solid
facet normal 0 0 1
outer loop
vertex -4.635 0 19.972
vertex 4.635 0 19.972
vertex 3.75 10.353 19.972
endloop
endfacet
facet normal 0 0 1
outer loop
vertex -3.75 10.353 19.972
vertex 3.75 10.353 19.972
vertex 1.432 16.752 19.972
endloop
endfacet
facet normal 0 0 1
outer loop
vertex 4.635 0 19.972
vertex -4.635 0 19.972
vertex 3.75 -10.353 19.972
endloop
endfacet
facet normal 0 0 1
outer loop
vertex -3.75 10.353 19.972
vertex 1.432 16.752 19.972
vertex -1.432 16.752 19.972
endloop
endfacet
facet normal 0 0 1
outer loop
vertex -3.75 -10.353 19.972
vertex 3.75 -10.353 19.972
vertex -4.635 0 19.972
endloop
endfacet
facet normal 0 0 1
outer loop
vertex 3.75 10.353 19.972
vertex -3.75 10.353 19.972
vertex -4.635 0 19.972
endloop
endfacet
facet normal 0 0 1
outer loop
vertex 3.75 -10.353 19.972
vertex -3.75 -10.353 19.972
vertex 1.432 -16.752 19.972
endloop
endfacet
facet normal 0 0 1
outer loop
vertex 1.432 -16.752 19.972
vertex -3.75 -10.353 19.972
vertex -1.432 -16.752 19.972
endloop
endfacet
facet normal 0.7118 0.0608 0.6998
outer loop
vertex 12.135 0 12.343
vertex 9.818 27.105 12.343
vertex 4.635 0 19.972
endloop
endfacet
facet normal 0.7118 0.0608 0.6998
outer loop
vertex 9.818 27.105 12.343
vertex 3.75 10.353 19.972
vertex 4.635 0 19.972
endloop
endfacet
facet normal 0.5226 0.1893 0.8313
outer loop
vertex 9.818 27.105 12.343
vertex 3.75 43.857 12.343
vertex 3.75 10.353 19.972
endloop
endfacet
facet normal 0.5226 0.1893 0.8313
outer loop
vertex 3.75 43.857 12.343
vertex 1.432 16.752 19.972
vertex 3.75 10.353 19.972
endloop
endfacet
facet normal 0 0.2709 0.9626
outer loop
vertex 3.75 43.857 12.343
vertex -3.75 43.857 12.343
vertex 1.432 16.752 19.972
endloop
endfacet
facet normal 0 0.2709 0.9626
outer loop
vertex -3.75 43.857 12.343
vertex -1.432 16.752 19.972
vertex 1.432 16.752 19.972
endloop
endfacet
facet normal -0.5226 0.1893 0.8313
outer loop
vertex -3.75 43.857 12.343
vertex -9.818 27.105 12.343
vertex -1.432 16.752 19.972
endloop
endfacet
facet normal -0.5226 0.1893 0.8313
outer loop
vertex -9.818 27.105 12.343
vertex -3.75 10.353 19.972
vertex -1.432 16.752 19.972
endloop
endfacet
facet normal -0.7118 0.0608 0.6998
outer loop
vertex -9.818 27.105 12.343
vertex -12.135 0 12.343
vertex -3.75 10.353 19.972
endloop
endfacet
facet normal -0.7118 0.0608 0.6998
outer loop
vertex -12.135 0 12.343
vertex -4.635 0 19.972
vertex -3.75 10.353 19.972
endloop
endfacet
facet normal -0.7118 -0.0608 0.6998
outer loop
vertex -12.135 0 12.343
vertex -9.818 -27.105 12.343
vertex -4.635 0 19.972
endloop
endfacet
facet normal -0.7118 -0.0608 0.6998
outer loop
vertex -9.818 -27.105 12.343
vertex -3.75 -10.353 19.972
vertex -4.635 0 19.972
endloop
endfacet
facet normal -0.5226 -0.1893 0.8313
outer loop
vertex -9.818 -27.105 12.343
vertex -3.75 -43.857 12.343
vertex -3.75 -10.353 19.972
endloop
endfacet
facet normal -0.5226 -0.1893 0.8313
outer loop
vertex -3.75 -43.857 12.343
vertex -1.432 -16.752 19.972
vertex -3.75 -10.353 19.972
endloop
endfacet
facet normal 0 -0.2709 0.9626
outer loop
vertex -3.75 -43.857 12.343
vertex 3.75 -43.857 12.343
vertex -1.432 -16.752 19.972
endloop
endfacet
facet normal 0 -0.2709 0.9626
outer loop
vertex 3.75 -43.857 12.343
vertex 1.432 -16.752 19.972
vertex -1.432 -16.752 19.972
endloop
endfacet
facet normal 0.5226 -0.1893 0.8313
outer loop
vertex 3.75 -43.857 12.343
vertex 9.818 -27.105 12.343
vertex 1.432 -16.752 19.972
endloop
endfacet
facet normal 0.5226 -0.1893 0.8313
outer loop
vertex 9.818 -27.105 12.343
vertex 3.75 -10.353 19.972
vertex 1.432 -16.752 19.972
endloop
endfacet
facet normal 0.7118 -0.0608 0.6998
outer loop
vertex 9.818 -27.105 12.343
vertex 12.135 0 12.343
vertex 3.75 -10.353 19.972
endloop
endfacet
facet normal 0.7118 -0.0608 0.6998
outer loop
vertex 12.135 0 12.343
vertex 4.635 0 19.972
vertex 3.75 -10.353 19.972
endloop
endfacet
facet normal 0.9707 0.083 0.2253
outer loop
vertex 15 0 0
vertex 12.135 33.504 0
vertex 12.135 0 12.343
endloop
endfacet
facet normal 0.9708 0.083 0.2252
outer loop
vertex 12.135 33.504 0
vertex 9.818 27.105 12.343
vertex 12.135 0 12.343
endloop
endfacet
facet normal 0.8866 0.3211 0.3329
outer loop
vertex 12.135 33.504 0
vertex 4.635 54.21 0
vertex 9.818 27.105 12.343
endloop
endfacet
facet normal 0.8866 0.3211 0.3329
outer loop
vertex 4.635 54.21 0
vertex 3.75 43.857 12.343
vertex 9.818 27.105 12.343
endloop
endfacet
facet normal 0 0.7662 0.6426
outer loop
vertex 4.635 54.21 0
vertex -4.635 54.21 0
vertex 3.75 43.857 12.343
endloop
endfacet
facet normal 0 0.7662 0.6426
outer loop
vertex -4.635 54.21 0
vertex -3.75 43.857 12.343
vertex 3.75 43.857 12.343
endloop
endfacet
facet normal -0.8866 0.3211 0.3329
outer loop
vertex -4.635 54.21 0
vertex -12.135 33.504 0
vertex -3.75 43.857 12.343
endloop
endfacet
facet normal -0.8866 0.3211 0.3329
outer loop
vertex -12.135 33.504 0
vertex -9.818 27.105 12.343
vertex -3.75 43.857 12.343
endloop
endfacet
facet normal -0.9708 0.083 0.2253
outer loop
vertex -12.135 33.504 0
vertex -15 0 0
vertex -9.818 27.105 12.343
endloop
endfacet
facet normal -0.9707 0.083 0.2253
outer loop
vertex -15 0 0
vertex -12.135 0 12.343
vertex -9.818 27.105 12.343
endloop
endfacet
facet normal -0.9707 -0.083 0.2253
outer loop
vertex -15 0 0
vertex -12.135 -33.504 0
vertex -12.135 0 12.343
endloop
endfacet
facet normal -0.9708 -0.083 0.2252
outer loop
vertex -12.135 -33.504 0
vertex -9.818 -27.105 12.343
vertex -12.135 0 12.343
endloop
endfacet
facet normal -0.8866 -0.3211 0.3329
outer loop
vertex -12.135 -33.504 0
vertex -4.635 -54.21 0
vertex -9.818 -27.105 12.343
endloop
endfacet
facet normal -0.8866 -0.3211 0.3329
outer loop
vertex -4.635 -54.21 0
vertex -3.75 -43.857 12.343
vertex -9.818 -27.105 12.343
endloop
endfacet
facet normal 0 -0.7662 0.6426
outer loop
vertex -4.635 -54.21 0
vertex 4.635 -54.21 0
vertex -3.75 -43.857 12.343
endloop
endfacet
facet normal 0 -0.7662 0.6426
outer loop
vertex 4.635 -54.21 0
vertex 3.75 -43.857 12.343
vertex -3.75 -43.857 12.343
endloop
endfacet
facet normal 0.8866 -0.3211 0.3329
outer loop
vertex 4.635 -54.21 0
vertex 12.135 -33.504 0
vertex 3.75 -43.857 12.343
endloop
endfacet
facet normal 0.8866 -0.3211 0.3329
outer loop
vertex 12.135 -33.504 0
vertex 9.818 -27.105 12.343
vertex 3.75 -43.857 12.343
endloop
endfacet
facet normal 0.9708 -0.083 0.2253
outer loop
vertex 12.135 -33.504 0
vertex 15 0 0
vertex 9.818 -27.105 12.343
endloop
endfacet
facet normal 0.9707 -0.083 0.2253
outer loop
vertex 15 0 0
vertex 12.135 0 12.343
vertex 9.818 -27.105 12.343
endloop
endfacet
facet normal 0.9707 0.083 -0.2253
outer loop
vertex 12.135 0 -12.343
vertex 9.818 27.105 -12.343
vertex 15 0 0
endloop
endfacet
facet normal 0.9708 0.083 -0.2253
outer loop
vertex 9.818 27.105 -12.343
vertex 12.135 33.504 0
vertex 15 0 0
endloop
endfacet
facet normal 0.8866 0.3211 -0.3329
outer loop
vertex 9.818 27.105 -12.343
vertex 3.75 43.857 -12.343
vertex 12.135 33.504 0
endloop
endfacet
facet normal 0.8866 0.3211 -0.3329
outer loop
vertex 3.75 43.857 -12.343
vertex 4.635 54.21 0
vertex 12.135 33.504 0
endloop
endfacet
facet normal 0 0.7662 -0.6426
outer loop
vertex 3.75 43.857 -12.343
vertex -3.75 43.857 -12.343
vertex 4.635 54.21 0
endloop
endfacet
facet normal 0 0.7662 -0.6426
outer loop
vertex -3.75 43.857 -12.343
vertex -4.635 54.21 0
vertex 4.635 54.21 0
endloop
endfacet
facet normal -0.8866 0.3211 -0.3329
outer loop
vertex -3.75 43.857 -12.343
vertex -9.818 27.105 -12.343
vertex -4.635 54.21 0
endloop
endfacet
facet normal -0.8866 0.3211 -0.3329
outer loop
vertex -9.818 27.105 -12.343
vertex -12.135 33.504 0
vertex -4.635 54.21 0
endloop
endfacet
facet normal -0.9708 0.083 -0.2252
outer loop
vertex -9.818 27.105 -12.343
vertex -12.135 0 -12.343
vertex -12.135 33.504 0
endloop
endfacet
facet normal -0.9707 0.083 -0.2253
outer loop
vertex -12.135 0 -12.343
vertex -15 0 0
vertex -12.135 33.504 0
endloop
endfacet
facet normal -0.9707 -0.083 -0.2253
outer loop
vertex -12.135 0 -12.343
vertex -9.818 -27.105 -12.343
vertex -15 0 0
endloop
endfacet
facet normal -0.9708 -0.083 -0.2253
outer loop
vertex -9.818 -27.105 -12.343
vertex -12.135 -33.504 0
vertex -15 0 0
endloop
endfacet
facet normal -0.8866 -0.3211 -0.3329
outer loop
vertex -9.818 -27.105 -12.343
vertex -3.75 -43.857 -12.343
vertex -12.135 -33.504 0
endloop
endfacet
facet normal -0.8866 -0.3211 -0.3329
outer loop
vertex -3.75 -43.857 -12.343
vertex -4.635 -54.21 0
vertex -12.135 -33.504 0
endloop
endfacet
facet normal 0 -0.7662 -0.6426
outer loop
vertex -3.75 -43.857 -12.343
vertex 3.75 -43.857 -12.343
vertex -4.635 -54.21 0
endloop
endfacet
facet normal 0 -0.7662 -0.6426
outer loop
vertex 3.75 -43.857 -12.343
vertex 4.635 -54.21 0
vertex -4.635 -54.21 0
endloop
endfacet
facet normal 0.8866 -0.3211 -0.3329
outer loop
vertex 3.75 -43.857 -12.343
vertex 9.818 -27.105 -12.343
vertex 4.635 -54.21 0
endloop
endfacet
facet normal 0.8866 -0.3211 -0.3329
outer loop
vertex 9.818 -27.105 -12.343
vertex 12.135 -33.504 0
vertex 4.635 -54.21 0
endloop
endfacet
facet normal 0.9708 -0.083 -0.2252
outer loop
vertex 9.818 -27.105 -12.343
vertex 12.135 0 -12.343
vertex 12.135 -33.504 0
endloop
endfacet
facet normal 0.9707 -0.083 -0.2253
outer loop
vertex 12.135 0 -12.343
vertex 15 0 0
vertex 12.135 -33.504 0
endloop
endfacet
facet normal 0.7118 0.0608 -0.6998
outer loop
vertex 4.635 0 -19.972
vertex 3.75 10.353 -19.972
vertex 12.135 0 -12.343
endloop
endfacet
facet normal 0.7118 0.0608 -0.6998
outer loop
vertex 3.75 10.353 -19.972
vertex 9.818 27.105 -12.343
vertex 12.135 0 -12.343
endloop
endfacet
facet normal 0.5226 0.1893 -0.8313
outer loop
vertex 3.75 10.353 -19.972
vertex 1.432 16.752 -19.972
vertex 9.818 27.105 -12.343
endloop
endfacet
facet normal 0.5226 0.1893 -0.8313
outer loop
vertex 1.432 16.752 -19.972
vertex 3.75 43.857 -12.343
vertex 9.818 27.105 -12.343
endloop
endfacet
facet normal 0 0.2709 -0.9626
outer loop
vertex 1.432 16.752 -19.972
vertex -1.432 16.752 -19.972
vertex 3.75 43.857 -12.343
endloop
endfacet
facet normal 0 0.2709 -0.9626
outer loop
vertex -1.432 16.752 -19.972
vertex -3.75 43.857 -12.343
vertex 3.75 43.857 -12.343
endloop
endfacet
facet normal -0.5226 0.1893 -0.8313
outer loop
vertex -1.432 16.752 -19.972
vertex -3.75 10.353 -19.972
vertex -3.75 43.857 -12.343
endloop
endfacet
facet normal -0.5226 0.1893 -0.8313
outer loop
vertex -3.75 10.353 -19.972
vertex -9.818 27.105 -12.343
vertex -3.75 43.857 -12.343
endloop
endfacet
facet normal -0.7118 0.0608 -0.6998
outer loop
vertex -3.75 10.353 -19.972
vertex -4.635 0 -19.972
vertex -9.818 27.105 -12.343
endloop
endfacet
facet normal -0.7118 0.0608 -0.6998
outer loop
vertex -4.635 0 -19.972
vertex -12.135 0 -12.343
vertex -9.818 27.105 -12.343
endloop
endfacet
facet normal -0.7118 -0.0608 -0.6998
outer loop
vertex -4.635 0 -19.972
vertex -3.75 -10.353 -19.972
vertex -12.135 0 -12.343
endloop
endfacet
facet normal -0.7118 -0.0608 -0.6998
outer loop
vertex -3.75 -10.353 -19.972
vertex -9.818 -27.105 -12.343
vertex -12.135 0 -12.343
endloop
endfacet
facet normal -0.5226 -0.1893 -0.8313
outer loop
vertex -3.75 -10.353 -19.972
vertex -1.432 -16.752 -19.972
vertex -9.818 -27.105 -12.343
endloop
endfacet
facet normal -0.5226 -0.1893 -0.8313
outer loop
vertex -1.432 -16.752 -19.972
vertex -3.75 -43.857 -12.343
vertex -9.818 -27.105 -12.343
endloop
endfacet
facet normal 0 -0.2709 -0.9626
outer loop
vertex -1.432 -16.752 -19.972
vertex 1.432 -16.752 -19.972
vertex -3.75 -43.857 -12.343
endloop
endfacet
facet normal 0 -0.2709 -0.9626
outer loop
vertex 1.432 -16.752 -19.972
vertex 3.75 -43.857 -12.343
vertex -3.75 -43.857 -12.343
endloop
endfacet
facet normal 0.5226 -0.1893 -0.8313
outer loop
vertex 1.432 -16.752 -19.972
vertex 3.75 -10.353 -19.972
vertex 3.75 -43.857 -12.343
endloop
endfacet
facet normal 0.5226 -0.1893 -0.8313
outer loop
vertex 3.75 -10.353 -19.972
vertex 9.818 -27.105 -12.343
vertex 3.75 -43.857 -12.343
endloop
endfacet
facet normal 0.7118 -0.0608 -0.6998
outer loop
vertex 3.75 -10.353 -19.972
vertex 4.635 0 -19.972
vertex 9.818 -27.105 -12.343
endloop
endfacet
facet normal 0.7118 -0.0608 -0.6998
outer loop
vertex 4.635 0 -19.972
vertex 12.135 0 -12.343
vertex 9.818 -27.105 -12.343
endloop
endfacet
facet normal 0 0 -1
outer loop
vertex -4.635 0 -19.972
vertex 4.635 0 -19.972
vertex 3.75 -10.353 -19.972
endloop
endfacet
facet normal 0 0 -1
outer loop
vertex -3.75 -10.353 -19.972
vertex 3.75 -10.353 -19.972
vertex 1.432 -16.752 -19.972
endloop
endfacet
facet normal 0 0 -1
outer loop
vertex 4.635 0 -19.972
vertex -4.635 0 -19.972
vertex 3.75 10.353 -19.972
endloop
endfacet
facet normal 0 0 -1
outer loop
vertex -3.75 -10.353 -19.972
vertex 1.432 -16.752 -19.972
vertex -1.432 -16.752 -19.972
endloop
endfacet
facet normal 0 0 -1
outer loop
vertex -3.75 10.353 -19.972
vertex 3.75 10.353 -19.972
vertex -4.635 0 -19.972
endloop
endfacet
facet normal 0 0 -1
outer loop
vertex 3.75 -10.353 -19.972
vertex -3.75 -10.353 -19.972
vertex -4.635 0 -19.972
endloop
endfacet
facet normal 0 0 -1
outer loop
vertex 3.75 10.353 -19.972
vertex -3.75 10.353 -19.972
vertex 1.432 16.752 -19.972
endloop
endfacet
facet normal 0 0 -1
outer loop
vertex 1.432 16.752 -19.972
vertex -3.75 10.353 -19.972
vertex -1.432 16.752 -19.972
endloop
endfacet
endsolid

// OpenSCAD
// Generated by SolidPython 1.0.1 on 2020-07-29 00:46:47


scale(v = [5, 19, 7]) {
	sphere(r = 3);
}
/***********************************************
*********      SolidPython code:      **********
************************************************
 
# import packages: SolidPython
from solid import *
from solid.utils import *
from itertools import chain, combinations, permutations


class Resize:

    def __init__(self, scad_file):
        self.scad_file = scad_file
        #self.scad_file = import_scad(scad_file)
        # cone/cylinder param:
        self.r1 = 0
        self.r2 = 0
        self.h = 0
        # rectangular prism param:
        self.w = 0
        self.l = 0
        # ellipse param:
        self.r = 0

    # import OpenScad code (file name corresponds to shape)


    # classify shape + parameters
    def assign(self, param1, param2, param3):
        if self.scad_file == 'cone.scad':
            self.r1 = param1
            self.r2 = param2
            self.h = param3
        elif self.scad_file == 'cylinder.scad':
            self.r1 = param1
            self.r2 = param2
            self.h = param3
        elif self.scad_file == 'rectangularPrism.scad':
            self.h = param1
            self.l = param2
            self.w = param3
        else:
            self.r = param1
            self.h = param2

    # resize parameters
    def iterate(self):
        x = range(3, 20, 2)
        i = 1
        if self.scad_file == 'cone.scad':
            tempList = list(permutations(x, 2))
            for temp in tempList:
                param1 = temp[0]
                param2 = temp[1]
                filepath = 'produced_scad_files/' + 'cone' + str(param1) + '_' + str(param2) + '_' + '.scad'
                scad_render_to_file(cylinder(h=param1, r1=param2, r2=0), filepath)

        elif self.scad_file == 'cylinder.scad':
            tempList = list(permutations(x, 3))
            for temp in tempList:
                param1 = temp[0]
                param2 = temp[1]
                filepath = 'produced_scad_files/' + 'cylinder' + str(param1) + '_' + str(param2) + '_' + '.scad'
                scad_render_to_file(cylinder(h=param1, r1=param2, r2=param2), filepath)

        elif self.scad_file == 'rectangularPrism.scad':
            tempList = list(permutations(x, 3))
            for temp in tempList:
                param1 = temp[0]
                param2 = temp[1]
                param3 = temp[2]
                filepath = 'produced_scad_files/' + 'rectangularPrism' + str(param1) + '_' + str(param2) + '_' + str(
                    param3) + '.scad'
                scad_render_to_file(cube(size=(param1, param2, param3)), filepath)

        elif self.scad_file == 'ellipse.scad':
            tempList = list(permutations(x, 4))
            for temp in tempList:
                param1 = temp[0]
                param2 = temp[1]
                param3 = temp[2]
                param4 = temp[3]
                filepath = 'produced_scad_files/' + 'ellipse' + str(param1) + '_' + str(param2) + '_' + str(param3) + '_' + str(param4) + '.scad'
                scad_render_to_file(scale([param1, param2, param3])(sphere(r=param4)), filepath)

    def render_to_scadfile(self):
        scad_render_to_file(scad, 'example.scad') 
 
************************************************/
